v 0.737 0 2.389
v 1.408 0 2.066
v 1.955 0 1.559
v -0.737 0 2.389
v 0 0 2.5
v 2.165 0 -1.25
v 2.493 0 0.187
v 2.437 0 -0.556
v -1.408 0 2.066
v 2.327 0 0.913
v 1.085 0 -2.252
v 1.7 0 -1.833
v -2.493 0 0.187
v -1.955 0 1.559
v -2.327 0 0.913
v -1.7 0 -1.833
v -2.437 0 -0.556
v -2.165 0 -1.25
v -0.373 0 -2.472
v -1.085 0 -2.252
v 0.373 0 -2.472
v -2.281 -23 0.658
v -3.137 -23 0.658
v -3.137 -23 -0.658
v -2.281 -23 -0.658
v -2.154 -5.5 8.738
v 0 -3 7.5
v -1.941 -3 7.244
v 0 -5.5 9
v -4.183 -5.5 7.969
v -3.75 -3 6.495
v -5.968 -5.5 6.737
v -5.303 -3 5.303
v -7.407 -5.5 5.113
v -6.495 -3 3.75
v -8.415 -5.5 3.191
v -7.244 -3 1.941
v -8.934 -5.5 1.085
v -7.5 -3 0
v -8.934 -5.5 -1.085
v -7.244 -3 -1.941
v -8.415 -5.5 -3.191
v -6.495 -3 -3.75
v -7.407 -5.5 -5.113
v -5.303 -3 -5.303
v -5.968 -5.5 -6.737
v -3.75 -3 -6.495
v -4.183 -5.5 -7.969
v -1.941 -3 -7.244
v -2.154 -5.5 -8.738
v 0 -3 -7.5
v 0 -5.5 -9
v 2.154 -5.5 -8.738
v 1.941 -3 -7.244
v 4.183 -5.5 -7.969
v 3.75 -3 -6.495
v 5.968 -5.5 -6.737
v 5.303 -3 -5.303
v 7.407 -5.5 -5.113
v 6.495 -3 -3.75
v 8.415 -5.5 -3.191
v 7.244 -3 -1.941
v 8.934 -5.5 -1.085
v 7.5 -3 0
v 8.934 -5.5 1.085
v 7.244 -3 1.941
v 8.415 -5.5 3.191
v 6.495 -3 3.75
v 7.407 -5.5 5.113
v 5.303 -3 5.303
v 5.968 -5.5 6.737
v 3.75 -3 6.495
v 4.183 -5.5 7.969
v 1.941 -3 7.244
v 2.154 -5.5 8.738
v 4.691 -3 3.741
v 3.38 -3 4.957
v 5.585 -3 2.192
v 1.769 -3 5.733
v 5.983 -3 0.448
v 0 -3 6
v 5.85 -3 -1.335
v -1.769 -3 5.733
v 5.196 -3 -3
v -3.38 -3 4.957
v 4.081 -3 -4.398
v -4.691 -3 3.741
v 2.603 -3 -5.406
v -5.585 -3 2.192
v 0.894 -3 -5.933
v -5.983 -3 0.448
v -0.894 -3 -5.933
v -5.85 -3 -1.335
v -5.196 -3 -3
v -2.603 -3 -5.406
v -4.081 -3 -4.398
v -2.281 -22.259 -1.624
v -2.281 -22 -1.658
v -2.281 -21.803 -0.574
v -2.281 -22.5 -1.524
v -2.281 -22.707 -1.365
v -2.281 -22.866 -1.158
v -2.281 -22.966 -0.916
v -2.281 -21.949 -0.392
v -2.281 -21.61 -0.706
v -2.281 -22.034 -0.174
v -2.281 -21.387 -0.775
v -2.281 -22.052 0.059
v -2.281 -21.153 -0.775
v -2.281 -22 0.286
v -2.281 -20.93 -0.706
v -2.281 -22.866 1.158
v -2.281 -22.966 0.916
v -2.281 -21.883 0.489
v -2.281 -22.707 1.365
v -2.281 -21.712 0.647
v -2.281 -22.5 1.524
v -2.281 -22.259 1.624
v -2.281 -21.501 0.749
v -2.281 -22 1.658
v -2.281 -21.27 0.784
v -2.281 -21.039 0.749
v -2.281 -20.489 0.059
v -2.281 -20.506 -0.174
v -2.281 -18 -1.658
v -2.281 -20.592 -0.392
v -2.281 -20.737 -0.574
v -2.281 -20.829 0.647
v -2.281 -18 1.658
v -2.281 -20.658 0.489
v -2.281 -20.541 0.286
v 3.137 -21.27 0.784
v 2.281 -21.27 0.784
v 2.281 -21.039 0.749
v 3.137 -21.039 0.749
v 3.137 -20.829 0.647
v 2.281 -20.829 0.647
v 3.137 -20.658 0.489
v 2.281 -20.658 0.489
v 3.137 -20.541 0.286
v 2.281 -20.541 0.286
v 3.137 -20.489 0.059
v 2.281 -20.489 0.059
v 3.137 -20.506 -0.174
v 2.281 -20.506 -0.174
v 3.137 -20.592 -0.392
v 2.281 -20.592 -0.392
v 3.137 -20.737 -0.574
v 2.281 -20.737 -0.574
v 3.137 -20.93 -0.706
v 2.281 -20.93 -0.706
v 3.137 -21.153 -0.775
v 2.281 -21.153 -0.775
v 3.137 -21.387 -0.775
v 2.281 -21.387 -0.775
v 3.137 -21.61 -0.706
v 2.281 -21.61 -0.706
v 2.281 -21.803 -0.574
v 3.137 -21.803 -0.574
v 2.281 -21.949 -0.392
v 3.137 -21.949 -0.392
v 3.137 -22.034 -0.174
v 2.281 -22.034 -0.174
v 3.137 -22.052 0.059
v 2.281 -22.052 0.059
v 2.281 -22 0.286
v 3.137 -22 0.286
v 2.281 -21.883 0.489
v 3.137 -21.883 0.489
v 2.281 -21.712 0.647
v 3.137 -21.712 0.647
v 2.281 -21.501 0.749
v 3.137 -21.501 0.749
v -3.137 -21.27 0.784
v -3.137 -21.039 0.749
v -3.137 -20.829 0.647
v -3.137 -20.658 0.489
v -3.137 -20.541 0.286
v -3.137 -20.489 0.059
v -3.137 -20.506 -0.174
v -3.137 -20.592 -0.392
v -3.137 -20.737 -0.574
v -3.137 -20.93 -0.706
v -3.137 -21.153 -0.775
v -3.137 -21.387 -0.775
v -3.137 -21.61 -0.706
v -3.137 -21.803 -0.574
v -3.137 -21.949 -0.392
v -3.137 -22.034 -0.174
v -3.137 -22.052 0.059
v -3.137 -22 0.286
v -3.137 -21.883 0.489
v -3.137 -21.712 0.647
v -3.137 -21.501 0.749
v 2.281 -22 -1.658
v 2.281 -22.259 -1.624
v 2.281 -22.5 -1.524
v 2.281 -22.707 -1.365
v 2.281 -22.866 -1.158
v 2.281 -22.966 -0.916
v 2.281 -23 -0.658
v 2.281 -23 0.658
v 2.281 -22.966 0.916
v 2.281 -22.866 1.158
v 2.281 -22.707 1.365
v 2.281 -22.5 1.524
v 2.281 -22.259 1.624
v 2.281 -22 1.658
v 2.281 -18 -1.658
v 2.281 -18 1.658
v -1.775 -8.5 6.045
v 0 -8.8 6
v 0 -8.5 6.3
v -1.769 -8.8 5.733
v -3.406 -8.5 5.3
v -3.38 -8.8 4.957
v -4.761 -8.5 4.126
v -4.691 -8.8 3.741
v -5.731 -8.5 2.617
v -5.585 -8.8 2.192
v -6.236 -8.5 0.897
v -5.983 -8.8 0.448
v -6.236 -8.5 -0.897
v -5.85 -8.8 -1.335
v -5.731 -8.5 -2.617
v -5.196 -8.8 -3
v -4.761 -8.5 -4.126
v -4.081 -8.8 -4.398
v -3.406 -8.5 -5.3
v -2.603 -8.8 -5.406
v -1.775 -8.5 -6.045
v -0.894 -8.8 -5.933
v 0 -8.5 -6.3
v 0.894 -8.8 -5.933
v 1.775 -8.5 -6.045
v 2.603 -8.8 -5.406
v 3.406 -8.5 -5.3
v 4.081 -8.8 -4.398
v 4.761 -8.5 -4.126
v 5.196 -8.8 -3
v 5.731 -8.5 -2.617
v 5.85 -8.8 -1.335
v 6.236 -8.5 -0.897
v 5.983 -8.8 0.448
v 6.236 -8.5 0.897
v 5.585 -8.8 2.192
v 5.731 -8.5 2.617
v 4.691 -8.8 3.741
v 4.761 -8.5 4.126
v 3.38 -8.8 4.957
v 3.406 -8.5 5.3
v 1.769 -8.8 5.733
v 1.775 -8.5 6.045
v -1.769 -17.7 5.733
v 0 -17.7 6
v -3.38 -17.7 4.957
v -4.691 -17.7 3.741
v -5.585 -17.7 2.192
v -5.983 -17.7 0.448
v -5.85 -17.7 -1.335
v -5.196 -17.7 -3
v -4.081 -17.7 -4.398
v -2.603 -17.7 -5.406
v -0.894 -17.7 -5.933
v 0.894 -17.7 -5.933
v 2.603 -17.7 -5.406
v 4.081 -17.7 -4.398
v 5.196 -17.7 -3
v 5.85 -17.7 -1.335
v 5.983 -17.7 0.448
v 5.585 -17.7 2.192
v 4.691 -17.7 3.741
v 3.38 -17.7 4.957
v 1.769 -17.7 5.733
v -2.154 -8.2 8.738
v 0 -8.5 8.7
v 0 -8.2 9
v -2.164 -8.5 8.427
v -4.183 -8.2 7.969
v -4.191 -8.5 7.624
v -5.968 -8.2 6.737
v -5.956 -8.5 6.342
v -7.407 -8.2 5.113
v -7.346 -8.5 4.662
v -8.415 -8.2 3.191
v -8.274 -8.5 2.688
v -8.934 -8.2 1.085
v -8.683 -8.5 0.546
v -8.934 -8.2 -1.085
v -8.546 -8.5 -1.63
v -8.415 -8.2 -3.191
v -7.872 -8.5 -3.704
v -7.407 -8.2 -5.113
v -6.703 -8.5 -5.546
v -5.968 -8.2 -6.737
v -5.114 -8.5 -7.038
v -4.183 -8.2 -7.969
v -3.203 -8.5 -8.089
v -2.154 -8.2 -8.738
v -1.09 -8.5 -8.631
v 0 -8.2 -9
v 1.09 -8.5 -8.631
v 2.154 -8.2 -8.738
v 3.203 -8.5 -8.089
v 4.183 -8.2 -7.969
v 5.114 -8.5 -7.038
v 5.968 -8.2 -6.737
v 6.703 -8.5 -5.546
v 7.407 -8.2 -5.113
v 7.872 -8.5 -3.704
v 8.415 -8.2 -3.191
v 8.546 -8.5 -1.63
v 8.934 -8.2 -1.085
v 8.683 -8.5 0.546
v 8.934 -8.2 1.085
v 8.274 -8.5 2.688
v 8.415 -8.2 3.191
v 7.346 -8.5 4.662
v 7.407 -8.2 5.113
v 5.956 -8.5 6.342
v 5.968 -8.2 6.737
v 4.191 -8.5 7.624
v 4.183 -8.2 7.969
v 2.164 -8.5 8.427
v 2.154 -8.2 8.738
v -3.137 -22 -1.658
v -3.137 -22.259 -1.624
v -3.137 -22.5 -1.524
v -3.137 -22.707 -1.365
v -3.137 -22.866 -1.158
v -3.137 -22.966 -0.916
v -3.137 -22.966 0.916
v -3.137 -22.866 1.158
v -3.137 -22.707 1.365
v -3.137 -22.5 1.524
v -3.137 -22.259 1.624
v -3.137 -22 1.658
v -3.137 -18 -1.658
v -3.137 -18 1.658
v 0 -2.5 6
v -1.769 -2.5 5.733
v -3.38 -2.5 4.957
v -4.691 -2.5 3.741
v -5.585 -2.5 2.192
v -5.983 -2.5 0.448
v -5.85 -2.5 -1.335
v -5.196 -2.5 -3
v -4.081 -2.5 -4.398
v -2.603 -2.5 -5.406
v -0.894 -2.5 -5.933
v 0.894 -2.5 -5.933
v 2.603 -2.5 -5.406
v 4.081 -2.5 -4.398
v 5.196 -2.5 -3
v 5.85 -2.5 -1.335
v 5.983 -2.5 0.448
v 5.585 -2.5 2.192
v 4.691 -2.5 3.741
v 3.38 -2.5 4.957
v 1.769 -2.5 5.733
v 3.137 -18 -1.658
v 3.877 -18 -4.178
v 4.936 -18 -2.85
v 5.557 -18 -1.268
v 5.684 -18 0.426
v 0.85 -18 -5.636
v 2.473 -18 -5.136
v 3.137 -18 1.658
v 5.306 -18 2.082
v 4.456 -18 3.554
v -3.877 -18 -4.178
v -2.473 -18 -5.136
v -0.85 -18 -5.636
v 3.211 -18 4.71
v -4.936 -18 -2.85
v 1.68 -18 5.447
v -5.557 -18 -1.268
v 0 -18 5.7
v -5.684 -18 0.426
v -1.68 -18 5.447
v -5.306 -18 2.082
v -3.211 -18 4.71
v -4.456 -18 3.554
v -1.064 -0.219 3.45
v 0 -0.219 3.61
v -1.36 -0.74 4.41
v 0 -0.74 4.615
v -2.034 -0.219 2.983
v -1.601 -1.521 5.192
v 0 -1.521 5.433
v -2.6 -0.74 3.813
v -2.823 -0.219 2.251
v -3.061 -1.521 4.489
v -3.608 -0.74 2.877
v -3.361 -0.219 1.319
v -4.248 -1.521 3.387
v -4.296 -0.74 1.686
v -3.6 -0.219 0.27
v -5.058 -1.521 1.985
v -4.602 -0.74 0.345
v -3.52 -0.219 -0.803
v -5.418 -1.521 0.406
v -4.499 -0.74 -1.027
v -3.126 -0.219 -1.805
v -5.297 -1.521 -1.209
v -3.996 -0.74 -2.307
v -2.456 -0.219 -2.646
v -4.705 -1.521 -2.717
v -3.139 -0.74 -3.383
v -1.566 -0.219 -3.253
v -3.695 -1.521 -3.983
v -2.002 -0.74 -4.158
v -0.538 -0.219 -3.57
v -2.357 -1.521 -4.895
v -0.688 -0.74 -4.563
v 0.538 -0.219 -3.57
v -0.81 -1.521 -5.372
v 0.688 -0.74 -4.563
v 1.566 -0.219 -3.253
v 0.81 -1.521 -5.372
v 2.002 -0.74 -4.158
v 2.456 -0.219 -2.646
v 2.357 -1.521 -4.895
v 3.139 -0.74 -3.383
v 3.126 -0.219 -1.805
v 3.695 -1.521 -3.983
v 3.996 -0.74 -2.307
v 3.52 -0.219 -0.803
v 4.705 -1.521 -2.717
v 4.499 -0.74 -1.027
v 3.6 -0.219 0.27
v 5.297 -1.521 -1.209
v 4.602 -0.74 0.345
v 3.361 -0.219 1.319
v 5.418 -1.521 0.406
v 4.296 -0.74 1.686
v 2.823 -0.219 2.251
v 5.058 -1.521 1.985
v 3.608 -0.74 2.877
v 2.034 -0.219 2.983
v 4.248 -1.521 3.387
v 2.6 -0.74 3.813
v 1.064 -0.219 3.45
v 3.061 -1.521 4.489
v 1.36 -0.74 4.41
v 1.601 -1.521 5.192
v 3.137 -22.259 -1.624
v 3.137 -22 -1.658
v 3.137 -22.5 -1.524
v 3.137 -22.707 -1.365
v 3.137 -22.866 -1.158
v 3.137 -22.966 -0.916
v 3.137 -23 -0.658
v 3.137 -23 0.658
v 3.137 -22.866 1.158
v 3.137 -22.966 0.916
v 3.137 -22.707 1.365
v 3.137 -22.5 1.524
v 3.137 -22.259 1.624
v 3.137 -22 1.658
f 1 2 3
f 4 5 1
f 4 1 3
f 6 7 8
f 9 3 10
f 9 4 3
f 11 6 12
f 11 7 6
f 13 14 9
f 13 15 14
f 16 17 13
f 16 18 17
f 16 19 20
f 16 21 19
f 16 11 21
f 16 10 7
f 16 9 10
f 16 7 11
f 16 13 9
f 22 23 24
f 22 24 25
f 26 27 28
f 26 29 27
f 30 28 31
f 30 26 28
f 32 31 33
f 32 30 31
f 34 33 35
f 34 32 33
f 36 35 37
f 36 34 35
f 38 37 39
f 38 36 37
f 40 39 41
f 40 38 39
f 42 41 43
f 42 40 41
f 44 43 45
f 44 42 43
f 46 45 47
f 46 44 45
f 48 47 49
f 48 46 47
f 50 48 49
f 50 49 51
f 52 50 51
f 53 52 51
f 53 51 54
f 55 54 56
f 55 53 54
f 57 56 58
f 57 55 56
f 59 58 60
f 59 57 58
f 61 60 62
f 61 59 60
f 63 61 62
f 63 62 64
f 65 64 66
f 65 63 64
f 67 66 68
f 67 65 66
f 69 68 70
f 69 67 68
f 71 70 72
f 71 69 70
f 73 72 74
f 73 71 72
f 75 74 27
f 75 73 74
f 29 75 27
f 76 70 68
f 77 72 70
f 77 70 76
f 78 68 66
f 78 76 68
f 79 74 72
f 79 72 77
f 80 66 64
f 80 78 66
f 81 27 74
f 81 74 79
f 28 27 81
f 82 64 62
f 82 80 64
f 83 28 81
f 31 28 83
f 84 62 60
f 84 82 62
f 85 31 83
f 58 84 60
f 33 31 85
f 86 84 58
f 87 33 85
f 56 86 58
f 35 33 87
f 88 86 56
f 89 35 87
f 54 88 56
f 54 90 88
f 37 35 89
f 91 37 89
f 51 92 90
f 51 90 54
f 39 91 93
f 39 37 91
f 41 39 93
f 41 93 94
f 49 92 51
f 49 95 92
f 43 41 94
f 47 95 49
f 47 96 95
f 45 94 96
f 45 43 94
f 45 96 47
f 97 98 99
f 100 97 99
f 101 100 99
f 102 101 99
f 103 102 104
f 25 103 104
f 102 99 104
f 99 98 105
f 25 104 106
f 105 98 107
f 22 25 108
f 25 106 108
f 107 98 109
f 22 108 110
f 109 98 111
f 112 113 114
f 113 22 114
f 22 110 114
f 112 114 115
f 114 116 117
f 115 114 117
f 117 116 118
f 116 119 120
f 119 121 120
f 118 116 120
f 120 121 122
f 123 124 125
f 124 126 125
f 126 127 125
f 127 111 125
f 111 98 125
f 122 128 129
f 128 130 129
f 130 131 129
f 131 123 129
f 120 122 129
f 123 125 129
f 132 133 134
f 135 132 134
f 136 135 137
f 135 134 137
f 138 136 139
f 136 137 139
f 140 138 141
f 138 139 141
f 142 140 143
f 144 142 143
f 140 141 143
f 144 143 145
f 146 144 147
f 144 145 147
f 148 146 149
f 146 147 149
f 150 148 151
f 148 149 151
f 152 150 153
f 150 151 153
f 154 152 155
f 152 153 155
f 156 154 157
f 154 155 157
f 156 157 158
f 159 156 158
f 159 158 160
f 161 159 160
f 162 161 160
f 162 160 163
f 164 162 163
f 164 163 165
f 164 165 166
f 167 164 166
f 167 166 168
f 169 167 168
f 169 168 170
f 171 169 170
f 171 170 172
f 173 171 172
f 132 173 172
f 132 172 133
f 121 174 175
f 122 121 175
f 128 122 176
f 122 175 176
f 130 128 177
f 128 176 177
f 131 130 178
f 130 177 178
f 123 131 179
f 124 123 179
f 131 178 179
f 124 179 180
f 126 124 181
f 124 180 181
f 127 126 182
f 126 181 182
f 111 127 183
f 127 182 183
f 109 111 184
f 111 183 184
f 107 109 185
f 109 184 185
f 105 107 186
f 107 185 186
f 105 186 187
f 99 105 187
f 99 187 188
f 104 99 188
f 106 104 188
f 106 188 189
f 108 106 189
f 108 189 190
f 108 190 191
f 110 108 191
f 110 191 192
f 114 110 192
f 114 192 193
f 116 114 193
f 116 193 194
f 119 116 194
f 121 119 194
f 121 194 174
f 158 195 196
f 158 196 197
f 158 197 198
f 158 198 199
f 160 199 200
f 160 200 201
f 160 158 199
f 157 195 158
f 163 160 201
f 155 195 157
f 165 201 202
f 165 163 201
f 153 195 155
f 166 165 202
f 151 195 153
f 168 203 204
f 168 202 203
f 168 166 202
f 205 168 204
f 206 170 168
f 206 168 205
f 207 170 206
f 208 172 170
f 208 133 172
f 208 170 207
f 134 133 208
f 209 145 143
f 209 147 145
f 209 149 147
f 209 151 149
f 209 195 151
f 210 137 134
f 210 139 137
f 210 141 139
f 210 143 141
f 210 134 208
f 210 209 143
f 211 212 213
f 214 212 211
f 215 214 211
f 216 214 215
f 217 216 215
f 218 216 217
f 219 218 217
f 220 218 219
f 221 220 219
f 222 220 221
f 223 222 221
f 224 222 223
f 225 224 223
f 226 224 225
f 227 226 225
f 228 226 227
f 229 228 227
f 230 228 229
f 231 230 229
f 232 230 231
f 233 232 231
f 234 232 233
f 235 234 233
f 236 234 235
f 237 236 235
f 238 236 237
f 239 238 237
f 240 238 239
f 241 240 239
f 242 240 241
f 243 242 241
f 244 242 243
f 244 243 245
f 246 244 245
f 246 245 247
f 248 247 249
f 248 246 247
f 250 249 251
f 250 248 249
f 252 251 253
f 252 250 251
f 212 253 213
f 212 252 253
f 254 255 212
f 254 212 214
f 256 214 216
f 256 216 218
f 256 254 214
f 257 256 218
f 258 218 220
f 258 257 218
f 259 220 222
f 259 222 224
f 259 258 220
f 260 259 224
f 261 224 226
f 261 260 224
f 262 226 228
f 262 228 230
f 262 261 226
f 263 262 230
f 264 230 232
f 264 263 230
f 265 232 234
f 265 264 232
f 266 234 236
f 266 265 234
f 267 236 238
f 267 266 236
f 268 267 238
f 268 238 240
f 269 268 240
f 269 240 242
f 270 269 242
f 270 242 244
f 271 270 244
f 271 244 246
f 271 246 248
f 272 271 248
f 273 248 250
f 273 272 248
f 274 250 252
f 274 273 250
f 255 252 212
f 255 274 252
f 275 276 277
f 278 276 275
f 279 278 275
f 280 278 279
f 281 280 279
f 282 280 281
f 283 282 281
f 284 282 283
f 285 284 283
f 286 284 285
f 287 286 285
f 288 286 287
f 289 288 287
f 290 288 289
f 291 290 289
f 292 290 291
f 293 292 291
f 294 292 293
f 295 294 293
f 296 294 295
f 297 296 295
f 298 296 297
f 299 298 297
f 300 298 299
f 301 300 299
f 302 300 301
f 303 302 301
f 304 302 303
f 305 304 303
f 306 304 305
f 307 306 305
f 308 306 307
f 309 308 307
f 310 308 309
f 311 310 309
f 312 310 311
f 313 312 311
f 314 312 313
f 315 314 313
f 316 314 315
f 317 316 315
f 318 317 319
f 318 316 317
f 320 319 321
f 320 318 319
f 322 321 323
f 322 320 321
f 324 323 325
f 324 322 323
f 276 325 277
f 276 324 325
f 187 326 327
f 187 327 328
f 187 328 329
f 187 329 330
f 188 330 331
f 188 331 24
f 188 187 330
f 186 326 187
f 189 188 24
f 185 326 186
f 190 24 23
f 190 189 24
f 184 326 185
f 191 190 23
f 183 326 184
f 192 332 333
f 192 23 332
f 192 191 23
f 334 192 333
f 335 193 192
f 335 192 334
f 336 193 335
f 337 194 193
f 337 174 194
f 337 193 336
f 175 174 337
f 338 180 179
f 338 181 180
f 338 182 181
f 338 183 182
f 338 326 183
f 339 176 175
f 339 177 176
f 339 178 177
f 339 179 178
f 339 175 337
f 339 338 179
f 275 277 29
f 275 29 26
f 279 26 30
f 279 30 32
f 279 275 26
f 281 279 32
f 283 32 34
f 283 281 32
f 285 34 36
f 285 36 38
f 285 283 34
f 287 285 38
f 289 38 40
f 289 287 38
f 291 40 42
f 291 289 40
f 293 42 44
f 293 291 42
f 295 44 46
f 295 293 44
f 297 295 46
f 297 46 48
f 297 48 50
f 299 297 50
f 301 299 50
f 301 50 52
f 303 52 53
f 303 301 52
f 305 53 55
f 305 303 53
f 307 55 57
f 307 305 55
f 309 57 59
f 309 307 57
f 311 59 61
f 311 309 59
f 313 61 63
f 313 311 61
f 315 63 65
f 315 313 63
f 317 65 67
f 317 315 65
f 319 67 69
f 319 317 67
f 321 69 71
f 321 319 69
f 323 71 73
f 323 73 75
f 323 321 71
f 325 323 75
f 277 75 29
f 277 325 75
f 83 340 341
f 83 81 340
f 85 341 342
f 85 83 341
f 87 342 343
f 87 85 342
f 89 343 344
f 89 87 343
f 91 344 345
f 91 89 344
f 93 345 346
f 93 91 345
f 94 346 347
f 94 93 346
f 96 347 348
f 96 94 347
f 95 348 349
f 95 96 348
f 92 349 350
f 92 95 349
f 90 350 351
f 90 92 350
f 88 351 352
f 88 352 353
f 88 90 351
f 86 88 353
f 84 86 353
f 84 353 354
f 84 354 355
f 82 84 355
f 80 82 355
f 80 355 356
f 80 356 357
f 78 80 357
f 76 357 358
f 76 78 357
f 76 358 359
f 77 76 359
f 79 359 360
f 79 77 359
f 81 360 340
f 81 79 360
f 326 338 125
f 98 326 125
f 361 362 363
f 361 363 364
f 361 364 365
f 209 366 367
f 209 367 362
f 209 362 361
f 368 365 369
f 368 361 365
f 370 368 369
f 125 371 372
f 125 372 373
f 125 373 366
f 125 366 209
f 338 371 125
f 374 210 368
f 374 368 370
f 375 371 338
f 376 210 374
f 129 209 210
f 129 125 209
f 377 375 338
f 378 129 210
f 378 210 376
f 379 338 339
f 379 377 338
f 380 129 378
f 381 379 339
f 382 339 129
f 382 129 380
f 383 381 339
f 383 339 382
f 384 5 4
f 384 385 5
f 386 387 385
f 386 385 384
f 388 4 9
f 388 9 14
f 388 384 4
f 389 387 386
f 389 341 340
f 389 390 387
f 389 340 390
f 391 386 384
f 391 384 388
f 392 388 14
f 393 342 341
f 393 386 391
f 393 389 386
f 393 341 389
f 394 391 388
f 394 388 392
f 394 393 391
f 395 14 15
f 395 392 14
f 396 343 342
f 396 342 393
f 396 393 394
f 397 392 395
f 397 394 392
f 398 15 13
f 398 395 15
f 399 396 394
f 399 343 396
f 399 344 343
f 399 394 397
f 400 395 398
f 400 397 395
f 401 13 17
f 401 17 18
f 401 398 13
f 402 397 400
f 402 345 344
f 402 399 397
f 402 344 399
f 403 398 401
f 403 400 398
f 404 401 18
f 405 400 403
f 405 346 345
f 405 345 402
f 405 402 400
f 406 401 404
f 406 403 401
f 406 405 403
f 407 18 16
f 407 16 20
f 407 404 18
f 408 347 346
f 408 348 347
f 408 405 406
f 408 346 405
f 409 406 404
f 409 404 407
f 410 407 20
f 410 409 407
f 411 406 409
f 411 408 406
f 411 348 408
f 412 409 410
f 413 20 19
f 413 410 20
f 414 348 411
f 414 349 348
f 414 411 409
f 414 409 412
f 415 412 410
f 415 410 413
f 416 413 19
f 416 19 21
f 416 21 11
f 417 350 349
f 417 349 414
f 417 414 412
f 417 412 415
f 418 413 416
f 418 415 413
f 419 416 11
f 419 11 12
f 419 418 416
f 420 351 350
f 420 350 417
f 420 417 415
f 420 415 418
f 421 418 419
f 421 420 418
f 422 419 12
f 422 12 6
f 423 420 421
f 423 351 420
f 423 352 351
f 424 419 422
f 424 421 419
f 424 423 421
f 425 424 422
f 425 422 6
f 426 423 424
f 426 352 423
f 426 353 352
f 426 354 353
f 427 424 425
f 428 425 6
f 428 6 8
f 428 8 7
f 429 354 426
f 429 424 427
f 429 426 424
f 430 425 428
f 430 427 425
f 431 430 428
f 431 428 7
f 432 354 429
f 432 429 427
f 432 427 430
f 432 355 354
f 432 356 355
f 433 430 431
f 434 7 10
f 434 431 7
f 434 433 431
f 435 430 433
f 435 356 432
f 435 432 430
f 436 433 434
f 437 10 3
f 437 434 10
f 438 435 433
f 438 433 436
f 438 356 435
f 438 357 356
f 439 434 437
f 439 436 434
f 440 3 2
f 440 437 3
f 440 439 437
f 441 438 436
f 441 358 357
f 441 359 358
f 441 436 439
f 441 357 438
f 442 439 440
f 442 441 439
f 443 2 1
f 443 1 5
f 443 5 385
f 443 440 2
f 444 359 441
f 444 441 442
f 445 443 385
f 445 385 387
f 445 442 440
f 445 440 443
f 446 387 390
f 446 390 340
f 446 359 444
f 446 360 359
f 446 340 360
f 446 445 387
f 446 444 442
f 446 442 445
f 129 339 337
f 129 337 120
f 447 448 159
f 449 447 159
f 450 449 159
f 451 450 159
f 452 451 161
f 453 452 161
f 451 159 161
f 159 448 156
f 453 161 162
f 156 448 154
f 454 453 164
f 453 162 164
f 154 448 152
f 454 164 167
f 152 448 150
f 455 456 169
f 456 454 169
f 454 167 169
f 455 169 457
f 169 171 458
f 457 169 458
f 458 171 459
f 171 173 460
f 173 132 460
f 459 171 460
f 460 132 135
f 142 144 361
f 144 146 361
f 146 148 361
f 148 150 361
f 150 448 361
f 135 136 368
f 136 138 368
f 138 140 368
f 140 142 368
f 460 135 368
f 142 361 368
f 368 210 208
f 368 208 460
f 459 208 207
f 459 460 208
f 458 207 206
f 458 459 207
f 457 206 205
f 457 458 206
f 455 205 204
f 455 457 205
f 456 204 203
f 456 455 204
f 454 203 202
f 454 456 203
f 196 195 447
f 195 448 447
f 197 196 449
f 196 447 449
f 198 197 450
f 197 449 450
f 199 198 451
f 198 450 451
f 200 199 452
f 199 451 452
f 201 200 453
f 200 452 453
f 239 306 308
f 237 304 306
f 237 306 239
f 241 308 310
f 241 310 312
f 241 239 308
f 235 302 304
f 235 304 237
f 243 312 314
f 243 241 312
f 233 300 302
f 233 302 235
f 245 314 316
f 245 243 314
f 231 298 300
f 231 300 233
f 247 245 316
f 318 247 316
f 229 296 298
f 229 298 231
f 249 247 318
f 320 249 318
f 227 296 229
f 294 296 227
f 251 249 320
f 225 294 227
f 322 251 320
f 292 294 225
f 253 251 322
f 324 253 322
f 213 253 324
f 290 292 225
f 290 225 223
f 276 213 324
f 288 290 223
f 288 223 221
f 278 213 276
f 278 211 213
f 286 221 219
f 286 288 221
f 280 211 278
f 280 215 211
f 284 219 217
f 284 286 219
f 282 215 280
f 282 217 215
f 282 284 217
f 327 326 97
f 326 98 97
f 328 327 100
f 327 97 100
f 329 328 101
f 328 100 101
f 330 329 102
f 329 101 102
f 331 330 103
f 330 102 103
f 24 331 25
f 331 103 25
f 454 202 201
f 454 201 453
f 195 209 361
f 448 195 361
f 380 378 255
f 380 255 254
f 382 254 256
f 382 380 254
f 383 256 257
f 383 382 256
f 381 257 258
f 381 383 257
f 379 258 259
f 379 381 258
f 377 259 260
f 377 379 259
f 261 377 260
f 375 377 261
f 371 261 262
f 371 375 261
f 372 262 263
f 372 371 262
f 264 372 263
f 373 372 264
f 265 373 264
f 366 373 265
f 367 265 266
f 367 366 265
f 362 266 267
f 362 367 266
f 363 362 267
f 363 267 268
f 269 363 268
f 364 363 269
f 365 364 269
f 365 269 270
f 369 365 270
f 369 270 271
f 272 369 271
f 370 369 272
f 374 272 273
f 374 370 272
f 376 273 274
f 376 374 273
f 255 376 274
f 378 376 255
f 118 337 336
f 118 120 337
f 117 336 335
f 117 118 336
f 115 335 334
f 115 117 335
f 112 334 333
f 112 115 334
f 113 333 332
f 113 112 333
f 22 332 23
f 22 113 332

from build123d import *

# Parameters (mm, degrees)
CHAMFER1_SIZE       = 0.3
SKETCH2_W           = 0.855522376
SKETCH2_H           = 3.315149208
BOSS_EXTRUDE1_DEPTH = 5
SKETCH3_R           = 0.78364852
CUT_EXTRUDE1_DEPTH  = 12
FILLET1_R           = 1


with BuildPart() as part:
    # Sketch1 → Revolve1 (revolve)
    with BuildSketch(Plane.XY, mode=Mode.PRIVATE) as revolve1_sk:
        with BuildLine():
            Line((0, 0), (2.5, 0))
            ThreePointArc((2.5, 0), (4.614619792, -0.739532292), (6, -2.5))
            Line((6, -2.5), (6, -3))
            Line((6, -3), (7.5, -3))
            Line((7.5, -3), (9, -5.5))
            Line((9, -5.5), (9, -8.5))
            Line((9, -8.5), (6, -8.5))
            Line((6, -8.5), (6, -18))
            Line((6, -18), (0, -18))
            Line((0, -18), (0, 0))
        make_face()
    revolve(revolve1_sk.sketch.rotate(Axis((0, 0, 0), (0, -1, 0)), 90), axis=Axis((0, 0, 0), (0, -1, 0)))

    # Chamfer1
    chamfer1_edges = [part.edges().sort_by_distance(p)[0] for p in [
        (0, -8.5, -6),
        (0, -18, -6),
        (0, -8.5, -9),
    ]]
    chamfer(chamfer1_edges, length=CHAMFER1_SIZE)

    # Sketch2 → Boss-Extrude1 (add)
    with BuildSketch(Plane.XZ.offset(18)):
        with Locations((2.709154191, 0)):
            Rectangle(SKETCH2_W, SKETCH2_H)
        with Locations((-2.709154191, 0)):
            Rectangle(SKETCH2_W, SKETCH2_H)
    extrude(amount=BOSS_EXTRUDE1_DEPTH)

    # Sketch3 → Cut-Extrude1 (cut)
    with BuildSketch(Plane.ZY.offset(3.136915379)):
        with Locations((0, -21.270184358)):
            Circle(SKETCH3_R)
    extrude(amount=-CUT_EXTRUDE1_DEPTH, mode=Mode.SUBTRACT)

    # Fillet1
    fillet1_edges = [part.edges().sort_by_distance(p)[0] for p in [
        (2.709154191, -23, 1.657574604),
        (2.709154191, -23, -1.657574604),
        (-2.709154191, -23, 1.657574604),
        (-2.709154191, -23, -1.657574604),
    ]]
    fillet(fillet1_edges, radius=FILLET1_R)


solid = part.part
